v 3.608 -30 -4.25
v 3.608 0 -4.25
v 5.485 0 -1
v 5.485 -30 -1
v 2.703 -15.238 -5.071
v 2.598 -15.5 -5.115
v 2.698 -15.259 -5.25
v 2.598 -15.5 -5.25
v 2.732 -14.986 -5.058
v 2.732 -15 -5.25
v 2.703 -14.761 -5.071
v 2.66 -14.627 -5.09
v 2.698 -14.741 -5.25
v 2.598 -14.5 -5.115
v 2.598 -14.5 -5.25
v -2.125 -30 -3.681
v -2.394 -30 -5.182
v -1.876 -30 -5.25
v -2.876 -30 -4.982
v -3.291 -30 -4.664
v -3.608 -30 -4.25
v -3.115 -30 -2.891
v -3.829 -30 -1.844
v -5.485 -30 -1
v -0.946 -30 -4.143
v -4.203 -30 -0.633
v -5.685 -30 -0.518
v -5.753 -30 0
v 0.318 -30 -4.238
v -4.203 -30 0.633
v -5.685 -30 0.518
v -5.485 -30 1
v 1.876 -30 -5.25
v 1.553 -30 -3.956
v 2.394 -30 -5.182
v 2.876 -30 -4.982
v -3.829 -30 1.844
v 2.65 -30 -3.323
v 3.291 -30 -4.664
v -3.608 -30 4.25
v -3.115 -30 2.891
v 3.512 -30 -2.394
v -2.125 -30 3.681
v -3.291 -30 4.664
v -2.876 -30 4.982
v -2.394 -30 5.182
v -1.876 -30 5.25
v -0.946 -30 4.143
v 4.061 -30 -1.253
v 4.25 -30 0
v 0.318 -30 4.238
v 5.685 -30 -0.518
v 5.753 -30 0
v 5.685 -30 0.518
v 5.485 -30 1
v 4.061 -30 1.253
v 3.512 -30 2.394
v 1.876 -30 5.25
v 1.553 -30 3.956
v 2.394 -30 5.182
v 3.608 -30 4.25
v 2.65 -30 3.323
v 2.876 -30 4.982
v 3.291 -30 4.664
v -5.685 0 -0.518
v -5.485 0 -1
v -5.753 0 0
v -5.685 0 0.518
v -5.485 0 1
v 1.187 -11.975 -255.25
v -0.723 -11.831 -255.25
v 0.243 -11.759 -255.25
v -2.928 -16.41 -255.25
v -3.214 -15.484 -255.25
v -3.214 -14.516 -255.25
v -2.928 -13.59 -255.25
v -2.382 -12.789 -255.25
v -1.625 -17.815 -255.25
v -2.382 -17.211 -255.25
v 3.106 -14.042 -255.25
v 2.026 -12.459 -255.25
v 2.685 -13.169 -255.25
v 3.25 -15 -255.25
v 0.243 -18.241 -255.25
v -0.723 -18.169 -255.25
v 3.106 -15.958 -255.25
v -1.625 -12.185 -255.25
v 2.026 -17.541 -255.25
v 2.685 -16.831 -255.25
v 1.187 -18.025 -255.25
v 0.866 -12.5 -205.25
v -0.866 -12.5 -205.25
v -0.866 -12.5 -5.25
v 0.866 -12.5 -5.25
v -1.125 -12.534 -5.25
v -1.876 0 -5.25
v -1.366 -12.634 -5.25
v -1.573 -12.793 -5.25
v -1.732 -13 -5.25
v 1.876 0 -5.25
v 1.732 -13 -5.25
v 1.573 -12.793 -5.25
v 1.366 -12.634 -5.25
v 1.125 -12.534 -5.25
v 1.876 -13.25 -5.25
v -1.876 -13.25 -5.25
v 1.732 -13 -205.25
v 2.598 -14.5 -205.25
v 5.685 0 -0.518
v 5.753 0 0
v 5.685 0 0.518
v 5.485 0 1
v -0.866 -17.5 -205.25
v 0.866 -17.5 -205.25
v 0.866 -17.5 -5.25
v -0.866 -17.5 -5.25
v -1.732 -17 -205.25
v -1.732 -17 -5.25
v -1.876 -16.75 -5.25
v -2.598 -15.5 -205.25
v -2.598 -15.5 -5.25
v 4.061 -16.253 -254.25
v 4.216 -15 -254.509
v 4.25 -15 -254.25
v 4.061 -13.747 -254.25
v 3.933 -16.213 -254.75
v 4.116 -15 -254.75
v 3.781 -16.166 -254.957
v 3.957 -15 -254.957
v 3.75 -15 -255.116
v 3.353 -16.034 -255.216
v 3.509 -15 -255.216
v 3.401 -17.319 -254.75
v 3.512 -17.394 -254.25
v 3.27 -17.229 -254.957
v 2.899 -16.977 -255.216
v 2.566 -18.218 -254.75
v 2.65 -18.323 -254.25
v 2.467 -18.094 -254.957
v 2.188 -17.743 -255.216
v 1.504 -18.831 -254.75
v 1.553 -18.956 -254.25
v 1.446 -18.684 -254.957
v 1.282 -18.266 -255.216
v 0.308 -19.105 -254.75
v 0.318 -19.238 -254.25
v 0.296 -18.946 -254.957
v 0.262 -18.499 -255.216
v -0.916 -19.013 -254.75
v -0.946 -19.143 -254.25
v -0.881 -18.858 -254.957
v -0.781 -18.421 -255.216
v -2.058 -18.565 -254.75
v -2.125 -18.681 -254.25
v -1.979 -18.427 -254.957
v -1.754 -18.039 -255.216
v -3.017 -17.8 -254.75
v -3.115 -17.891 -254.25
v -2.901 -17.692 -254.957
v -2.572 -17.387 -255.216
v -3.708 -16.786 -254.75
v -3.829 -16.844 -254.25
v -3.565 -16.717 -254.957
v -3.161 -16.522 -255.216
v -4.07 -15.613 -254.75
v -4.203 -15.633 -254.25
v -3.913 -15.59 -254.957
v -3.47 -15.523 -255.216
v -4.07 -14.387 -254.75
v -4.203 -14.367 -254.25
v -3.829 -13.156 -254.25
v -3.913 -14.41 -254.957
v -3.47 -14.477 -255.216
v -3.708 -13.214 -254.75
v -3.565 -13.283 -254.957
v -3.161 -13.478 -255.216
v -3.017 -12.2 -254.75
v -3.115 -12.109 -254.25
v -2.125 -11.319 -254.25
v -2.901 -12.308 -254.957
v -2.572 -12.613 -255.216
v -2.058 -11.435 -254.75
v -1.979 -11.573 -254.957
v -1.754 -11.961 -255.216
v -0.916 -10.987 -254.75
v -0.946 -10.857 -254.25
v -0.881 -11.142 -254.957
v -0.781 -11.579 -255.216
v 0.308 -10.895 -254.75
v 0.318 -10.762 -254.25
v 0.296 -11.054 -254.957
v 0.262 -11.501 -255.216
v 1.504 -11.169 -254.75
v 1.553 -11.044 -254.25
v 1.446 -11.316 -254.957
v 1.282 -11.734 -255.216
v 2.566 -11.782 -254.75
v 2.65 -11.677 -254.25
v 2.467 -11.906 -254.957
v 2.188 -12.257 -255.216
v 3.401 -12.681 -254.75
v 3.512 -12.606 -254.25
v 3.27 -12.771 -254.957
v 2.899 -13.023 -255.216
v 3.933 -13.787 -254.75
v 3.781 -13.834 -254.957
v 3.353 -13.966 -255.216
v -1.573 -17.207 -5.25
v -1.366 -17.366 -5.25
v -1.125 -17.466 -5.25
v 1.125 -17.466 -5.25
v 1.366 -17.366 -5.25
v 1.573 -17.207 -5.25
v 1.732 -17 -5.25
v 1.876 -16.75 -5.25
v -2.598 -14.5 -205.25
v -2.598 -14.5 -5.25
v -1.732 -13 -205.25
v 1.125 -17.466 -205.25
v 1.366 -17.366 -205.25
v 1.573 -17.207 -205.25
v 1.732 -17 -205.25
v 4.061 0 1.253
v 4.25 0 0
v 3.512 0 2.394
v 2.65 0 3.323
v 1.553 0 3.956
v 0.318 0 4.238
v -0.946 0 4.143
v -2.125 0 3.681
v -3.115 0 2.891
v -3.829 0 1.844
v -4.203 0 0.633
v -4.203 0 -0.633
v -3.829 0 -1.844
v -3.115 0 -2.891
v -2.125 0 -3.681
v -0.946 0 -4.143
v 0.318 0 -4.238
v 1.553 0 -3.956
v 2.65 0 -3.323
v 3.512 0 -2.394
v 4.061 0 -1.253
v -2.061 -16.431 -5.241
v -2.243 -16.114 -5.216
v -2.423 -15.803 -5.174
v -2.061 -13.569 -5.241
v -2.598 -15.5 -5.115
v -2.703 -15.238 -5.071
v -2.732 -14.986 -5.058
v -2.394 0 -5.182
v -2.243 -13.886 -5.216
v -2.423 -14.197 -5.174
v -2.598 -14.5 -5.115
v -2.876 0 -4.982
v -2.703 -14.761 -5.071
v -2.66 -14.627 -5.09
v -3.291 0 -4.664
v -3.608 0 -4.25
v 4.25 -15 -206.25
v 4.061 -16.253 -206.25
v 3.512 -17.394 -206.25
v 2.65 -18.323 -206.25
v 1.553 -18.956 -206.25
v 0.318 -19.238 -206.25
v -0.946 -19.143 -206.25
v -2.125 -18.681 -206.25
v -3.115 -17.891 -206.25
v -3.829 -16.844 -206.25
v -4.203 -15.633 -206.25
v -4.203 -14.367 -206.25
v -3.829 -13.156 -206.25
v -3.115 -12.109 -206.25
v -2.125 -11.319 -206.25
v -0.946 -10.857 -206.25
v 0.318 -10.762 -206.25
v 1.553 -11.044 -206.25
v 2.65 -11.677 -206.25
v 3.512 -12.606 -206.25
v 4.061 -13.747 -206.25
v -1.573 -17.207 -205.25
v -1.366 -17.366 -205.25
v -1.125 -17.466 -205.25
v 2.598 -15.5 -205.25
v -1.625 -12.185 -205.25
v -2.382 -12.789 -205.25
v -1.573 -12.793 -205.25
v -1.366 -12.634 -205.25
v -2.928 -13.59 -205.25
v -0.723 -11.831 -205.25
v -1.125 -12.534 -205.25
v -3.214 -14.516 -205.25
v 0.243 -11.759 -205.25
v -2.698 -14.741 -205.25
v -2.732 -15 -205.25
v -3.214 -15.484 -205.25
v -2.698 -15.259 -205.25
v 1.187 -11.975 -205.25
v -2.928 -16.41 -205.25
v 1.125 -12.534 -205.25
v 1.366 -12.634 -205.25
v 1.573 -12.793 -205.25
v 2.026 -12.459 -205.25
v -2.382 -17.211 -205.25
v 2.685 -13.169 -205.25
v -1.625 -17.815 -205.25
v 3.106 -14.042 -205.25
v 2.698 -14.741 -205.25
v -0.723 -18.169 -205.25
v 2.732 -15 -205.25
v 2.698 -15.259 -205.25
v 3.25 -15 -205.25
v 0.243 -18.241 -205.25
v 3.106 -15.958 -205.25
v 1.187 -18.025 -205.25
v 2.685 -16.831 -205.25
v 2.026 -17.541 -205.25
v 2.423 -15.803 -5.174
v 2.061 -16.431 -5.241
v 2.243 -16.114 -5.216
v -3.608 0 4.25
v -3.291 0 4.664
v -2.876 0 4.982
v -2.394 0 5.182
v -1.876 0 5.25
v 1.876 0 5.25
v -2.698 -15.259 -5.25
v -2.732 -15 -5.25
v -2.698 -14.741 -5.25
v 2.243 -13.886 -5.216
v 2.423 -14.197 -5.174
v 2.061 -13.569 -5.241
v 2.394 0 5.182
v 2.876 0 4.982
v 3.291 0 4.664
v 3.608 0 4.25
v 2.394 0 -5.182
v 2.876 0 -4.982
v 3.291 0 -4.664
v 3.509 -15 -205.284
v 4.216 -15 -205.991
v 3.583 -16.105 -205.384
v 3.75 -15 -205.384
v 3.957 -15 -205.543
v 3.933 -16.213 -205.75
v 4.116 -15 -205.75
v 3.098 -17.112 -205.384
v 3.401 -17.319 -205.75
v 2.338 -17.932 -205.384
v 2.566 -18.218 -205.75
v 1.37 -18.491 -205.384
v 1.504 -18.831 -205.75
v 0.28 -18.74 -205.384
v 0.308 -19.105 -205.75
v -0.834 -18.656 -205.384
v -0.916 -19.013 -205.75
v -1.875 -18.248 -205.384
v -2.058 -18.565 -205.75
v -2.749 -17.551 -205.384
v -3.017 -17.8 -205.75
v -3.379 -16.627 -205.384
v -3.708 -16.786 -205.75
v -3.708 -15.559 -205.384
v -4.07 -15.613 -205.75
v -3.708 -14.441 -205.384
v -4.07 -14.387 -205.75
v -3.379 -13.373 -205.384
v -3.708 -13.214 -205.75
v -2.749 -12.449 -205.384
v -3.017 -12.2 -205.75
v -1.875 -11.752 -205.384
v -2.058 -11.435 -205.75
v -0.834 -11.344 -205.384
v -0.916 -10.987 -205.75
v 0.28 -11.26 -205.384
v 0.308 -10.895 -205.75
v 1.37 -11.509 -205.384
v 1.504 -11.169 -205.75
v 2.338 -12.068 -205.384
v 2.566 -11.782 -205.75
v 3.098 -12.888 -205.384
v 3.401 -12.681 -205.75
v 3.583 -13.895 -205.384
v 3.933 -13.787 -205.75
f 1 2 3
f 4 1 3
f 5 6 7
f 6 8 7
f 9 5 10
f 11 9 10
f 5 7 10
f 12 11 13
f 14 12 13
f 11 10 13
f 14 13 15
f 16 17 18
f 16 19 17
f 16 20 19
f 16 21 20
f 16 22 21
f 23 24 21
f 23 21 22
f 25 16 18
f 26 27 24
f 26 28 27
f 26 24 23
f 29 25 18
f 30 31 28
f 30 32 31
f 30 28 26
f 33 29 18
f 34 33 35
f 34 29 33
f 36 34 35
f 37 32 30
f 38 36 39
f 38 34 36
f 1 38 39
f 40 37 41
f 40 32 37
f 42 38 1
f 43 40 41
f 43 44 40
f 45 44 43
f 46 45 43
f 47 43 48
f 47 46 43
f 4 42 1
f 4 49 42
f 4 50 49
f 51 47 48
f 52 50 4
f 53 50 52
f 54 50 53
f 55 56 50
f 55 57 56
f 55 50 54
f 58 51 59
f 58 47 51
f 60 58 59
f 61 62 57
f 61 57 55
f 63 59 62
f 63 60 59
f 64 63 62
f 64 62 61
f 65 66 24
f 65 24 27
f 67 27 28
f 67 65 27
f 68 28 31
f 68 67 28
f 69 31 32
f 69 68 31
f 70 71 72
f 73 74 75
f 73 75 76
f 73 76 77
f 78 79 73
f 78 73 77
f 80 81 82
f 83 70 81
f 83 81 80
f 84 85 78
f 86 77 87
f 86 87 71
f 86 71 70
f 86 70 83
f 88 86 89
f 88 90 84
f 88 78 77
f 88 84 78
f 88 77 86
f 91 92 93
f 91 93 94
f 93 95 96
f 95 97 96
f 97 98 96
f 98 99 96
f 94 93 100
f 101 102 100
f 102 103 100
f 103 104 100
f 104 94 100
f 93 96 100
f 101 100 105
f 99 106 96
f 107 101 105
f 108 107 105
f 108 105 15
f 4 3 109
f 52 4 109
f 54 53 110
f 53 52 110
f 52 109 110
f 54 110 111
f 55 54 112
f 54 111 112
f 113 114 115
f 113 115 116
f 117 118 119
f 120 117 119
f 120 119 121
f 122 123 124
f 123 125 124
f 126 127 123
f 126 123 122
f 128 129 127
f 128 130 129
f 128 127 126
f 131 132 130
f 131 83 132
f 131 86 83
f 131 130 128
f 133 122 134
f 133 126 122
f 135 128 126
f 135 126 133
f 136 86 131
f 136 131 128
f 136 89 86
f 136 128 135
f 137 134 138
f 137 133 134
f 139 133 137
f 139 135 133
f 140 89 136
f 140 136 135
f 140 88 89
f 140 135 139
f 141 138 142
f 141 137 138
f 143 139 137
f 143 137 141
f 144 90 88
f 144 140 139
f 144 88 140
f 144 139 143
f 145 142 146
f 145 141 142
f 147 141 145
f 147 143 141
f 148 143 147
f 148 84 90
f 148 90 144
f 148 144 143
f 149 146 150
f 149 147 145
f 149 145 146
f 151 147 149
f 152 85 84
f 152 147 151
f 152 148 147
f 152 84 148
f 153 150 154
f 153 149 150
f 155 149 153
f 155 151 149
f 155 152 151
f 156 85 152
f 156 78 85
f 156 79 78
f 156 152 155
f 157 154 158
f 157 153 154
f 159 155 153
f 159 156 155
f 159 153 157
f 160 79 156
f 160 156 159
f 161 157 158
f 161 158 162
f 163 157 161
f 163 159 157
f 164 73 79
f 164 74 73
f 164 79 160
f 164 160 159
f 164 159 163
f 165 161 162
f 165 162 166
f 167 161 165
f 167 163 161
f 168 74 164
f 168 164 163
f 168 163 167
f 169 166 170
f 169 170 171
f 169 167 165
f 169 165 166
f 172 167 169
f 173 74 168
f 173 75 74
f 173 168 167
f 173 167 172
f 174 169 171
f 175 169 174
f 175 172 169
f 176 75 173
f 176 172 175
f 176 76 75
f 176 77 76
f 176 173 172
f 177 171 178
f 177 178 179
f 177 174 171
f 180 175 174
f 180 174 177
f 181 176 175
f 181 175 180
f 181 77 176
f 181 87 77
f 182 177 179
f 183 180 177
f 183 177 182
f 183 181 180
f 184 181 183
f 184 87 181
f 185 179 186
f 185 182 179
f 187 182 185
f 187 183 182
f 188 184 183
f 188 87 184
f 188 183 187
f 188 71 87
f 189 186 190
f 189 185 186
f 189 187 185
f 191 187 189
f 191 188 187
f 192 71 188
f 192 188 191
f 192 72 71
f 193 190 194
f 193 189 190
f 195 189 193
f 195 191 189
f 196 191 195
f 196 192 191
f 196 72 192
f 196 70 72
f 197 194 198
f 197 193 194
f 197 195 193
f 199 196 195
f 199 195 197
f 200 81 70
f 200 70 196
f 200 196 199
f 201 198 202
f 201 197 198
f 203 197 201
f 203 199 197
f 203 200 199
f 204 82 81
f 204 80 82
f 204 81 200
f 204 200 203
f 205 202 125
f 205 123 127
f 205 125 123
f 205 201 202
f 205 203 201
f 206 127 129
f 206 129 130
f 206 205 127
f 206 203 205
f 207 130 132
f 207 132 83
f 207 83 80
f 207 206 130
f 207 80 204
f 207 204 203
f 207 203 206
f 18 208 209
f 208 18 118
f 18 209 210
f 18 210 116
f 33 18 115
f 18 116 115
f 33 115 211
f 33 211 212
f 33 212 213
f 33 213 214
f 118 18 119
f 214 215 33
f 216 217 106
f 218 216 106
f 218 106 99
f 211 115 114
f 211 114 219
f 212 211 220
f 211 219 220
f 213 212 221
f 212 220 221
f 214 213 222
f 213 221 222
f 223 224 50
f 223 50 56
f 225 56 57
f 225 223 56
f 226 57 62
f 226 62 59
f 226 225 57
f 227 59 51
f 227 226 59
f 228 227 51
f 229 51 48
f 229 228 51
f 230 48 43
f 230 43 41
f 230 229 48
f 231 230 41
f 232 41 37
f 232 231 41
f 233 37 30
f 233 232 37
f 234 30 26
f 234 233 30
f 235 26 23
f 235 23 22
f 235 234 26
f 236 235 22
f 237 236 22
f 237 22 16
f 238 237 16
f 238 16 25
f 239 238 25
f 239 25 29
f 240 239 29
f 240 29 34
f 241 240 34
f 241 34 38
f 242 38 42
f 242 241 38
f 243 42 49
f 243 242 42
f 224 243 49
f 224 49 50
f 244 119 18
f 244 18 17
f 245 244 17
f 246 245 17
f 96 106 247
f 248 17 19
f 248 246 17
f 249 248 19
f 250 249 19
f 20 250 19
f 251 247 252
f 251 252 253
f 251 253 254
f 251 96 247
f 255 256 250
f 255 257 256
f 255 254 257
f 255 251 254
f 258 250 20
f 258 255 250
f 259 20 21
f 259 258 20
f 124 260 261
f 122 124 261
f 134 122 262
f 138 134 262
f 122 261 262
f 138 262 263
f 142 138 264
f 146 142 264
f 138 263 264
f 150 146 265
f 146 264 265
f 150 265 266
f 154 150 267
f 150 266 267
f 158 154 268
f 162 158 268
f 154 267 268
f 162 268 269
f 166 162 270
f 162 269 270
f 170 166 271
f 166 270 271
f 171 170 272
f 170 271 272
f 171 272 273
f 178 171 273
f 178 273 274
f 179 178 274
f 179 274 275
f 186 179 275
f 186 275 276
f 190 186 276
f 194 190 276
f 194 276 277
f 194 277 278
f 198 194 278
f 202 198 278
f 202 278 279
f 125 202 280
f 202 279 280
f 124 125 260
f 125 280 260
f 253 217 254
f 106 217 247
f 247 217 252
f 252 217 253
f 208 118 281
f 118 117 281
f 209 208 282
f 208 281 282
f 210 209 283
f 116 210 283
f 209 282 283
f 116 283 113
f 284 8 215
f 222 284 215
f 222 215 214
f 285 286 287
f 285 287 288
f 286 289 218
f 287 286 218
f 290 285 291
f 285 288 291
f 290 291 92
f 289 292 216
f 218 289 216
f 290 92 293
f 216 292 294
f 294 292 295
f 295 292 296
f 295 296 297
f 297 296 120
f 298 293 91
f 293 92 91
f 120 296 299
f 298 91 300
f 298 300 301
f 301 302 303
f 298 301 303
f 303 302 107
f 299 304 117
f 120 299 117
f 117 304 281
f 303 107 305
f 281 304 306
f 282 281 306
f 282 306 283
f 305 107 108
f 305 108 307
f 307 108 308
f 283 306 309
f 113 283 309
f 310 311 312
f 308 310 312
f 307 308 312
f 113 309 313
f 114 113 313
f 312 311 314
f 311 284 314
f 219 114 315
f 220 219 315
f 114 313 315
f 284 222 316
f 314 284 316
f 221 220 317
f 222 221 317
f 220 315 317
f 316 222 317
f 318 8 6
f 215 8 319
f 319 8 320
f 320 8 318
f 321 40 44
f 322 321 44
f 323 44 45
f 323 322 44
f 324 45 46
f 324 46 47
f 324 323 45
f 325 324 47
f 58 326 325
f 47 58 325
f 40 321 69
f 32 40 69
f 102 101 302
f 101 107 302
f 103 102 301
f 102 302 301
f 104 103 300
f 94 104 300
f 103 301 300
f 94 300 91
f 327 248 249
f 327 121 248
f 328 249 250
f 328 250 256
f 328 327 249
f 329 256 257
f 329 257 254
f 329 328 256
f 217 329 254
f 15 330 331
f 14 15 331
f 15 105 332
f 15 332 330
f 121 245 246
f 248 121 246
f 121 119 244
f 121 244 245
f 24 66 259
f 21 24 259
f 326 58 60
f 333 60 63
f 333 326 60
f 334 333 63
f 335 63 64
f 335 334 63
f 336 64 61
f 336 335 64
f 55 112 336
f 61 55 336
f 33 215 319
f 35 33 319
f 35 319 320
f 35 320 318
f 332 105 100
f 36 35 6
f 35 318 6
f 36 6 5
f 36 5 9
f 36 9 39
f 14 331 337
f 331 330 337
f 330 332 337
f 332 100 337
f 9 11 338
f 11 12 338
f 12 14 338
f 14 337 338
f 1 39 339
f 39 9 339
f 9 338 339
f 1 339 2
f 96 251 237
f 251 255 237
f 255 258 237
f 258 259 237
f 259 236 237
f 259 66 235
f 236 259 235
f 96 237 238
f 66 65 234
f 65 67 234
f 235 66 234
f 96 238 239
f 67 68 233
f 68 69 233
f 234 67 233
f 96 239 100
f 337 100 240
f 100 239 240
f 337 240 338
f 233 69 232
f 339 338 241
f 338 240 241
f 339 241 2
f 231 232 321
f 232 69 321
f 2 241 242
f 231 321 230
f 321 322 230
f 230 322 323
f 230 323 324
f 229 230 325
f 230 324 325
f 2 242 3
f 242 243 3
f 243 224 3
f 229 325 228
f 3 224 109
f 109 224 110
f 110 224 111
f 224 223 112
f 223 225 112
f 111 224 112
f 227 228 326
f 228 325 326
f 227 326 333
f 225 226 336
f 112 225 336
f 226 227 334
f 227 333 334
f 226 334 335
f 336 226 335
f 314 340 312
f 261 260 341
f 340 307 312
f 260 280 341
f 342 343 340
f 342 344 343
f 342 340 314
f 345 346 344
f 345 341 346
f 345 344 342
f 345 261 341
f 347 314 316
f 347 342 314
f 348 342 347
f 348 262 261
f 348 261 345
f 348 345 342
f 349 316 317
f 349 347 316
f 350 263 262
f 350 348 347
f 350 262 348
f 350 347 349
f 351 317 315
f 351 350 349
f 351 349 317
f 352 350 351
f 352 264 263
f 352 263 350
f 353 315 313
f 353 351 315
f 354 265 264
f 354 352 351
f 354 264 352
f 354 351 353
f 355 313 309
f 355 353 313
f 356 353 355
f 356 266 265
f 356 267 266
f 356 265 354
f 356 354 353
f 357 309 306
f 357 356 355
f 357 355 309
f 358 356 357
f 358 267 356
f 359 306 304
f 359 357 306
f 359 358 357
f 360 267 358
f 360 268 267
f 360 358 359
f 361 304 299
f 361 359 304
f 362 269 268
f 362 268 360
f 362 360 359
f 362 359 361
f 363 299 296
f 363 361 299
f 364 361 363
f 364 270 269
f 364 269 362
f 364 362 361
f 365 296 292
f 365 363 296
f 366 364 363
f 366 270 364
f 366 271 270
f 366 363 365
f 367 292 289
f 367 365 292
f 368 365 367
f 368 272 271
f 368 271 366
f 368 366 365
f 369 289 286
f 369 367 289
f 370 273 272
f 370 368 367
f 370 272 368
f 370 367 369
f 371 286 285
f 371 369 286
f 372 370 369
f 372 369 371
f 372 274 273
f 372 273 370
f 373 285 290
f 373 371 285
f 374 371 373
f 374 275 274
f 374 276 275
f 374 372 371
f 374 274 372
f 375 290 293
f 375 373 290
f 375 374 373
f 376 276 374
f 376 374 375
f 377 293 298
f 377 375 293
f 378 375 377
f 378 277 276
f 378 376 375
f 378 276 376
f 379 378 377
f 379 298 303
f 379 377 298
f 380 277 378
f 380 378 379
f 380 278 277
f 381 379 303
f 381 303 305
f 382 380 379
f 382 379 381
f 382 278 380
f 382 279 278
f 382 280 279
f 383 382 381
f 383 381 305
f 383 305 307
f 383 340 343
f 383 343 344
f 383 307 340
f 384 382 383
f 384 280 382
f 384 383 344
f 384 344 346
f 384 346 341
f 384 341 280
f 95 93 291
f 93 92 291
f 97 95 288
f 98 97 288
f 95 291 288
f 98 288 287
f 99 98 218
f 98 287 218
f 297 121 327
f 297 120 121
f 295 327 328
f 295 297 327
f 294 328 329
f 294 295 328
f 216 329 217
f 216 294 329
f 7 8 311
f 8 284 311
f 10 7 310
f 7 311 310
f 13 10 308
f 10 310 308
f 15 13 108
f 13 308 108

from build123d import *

# Parameters (mm, degrees)
F0_R         = 4.25
F1_DEPTH     = 30
F3_DEPTH     = 200
F4_R         = 4.25
F5_DEPTH     = 50
F6_T1_DEPTH  = 35.7735026919
F6_T6_DEPTH  = 35.7735026919
F6_T12_DEPTH = 35.7735026919
F6_T18_DEPTH = 35.7735026919
F6_T24_DEPTH = 35.7735026919
F6_T30_DEPTH = 35.7735026919
F6_T36_DEPTH = 35.7735026919
F7_R         = 1
F8_R         = 1


# Not quite as in the source:
# - a fillet or chamfer that OpenCascade refuses, or shapes differently, is made with other operations: its cross-section is extruded or revolved along the edge and cut away or added


with BuildPart() as f1:
    # F0 (on Front) → F1 (new body)
    with BuildSketch(Plane.XZ):
        Polygon((3.0310889132, 5.25), (-3.0310889132, 5.25), (-6.0621778265, 0), (-3.0310889132, -5.25), (3.0310889132, -5.25), (6.0621778265, 0), align=None)
        Circle(F0_R, mode=Mode.SUBTRACT)
    extrude(amount=F1_DEPTH)

    # F2 (on face) → F3 (join)
    with BuildSketch(Plane(origin=(0, 0, -5.25), x_dir=(1, 0, 0), z_dir=(0, 0, -1))):
        Polygon((-1.443375673, 12.5), (0, 12.5), (1.443375673, 12.5), (2.8867513459, 15), (1.443375673, 17.5), (-1.443375673, 17.5), (-2.8867513459, 15), align=None)
    extrude(amount=F3_DEPTH)

    # F4 (on face) → F5 (join)
    with BuildSketch(Plane(origin=(0, 0, -205.25), x_dir=(1, 0, 0), z_dir=(0, 0, -1))):
        with Locations((0, 15)):
            Circle(F4_R)
        Polygon((-1.443375673, 12.5), (-2.8867513459, 15), (-1.443375673, 17.5), (1.443375673, 17.5), (2.8867513459, 15), (1.443375673, 12.5), align=None, mode=Mode.SUBTRACT)
        Polygon((-1.443375673, 17.5), (-2.8867513459, 15), (-1.443375673, 12.5), (1.443375673, 12.5), (2.8867513459, 15), (1.443375673, 17.5), align=None)
    extrude(amount=F5_DEPTH)

    # F6: fillet of radius 2 on 6 edges, made by hand

    # F6_s2 → F6_t1 (cut)
    with BuildSketch(Plane.XZ.offset(-2.8867513459)):
        with BuildLine():
            ThreePointArc((5.4848275573, -1), (5.7527767497, 0), (5.4848275573, 1))
            Line((5.4848275573, 1), (6.0621778265, 0))
            Line((6.0621778265, 0), (5.4848275573, -1))
        make_face()
        with BuildLine():
            ThreePointArc((1.8763883749, 5.25), (2.8763883749, 4.9820508076), (3.6084391824, 4.25))
            Line((3.6084391824, 4.25), (3.0310889132, 5.25))
            Line((3.0310889132, 5.25), (1.8763883749, 5.25))
        make_face()
        with BuildLine():
            ThreePointArc((-3.6084391824, 4.25), (-2.8763883749, 4.9820508076), (-1.8763883749, 5.25))
            Line((-1.8763883749, 5.25), (-3.0310889132, 5.25))
            Line((-3.0310889132, 5.25), (-3.6084391824, 4.25))
        make_face()
        with BuildLine():
            ThreePointArc((-5.4848275573, -1), (-5.7527767497, 0), (-5.4848275573, 1))
            Line((-5.4848275573, 1), (-6.0621778265, 0))
            Line((-6.0621778265, 0), (-5.4848275573, -1))
        make_face()
    extrude(amount=F6_T1_DEPTH, mode=Mode.SUBTRACT)


with BuildPart() as f6_tool4:
    # F6_s5 → F6_t6 (new body)
    with BuildSketch(Plane.XZ.offset(-2.8867513459)):
        with BuildLine():
            ThreePointArc((1.8763883749, -5.25), (2.8763883749, -4.9820508076), (3.6084391824, -4.25))
            Line((3.6084391824, -4.25), (3.0310889132, -5.25))
            Line((3.0310889132, -5.25), (1.8763883749, -5.25))
        make_face()
    extrude(amount=F6_T6_DEPTH)

    split(bisect_by=Plane(origin=(-4.3301270189, -2.5, 0), x_dir=(0, 0, 1), z_dir=(0.8660254038, 0.5, 0)), keep=Keep.TOP)

    split(bisect_by=Plane(origin=(8.6602540378, -5, 0), x_dir=(0, 0, 1), z_dir=(-0.8660254038, 0.5, 0)), keep=Keep.TOP)


with BuildPart() as f1_1:
    add(f1.part)

    # F6_t3: cut F6_tool4
    add(f6_tool4.part, mode=Mode.SUBTRACT)


with BuildPart() as f6_tool10:
    # F6_s11 → F6_t12 (new body)
    with BuildSketch(Plane.XZ.offset(-2.8867513459)):
        with BuildLine():
            ThreePointArc((1.8763883749, -5.25), (2.8763883749, -4.9820508076), (3.6084391824, -4.25))
            Line((3.6084391824, -4.25), (3.0310889132, -5.25))
            Line((3.0310889132, -5.25), (1.8763883749, -5.25))
        make_face()
    extrude(amount=F6_T12_DEPTH)

    split(bisect_by=Plane(origin=(-4.3301270189, -2.5, 0), x_dir=(0, 0, 1), z_dir=(0.8660254038, 0.5, 0)), keep=Keep.TOP)

    split(bisect_by=Plane(origin=(8.6602540378, -5, 0), x_dir=(0, 0, 1), z_dir=(0.8660254038, -0.5, 0)), keep=Keep.TOP)


with BuildPart() as f1_2:
    add(f1_1.part)

    # F6_t9: cut F6_tool10
    add(f6_tool10.part, mode=Mode.SUBTRACT)


with BuildPart() as f6_tool16:
    # F6_s17 → F6_t18 (new body)
    with BuildSketch(Plane.XZ.offset(-2.8867513459)):
        with BuildLine():
            ThreePointArc((1.8763883749, -5.25), (2.8763883749, -4.9820508076), (3.6084391824, -4.25))
            Line((3.6084391824, -4.25), (3.0310889132, -5.25))
            Line((3.0310889132, -5.25), (1.8763883749, -5.25))
        make_face()
    extrude(amount=F6_T18_DEPTH)

    split(bisect_by=Plane(origin=(-4.3301270189, -2.5, 0), x_dir=(0, 0, 1), z_dir=(-0.8660254038, -0.5, 0)), keep=Keep.TOP)

    split(bisect_by=Plane(origin=(8.6602540378, -5, 0), x_dir=(0, 0, 1), z_dir=(0.8660254038, -0.5, 0)), keep=Keep.TOP)


with BuildPart() as f1_3:
    add(f1_2.part)

    # F6_t15: cut F6_tool16
    add(f6_tool16.part, mode=Mode.SUBTRACT)


with BuildPart() as f6_tool22:
    # F6_s23 → F6_t24 (new body)
    with BuildSketch(Plane.XZ.offset(-2.8867513459)):
        with BuildLine():
            ThreePointArc((-1.8763883749, -5.25), (-2.8763883749, -4.9820508076), (-3.6084391824, -4.25))
            Line((-3.6084391824, -4.25), (-3.0310889132, -5.25))
            Line((-3.0310889132, -5.25), (-1.8763883749, -5.25))
        make_face()
    extrude(amount=F6_T24_DEPTH)

    split(bisect_by=Plane(origin=(-8.6602540378, -5, 0), x_dir=(0, 0, 1), z_dir=(0.8660254038, 0.5, 0)), keep=Keep.TOP)

    split(bisect_by=Plane(origin=(4.3301270189, -2.5, 0), x_dir=(0, 0, 1), z_dir=(-0.8660254038, 0.5, 0)), keep=Keep.TOP)


with BuildPart() as f1_4:
    add(f1_3.part)

    # F6_t21: cut F6_tool22
    add(f6_tool22.part, mode=Mode.SUBTRACT)


with BuildPart() as f6_tool28:
    # F6_s29 → F6_t30 (new body)
    with BuildSketch(Plane.XZ.offset(-2.8867513459)):
        with BuildLine():
            ThreePointArc((-1.8763883749, -5.25), (-2.8763883749, -4.9820508076), (-3.6084391824, -4.25))
            Line((-3.6084391824, -4.25), (-3.0310889132, -5.25))
            Line((-3.0310889132, -5.25), (-1.8763883749, -5.25))
        make_face()
    extrude(amount=F6_T30_DEPTH)

    split(bisect_by=Plane(origin=(-8.6602540378, -5, 0), x_dir=(0, 0, 1), z_dir=(-0.8660254038, -0.5, 0)), keep=Keep.TOP)

    split(bisect_by=Plane(origin=(4.3301270189, -2.5, 0), x_dir=(0, 0, 1), z_dir=(-0.8660254038, 0.5, 0)), keep=Keep.TOP)


with BuildPart() as f1_5:
    add(f1_4.part)

    # F6_t27: cut F6_tool28
    add(f6_tool28.part, mode=Mode.SUBTRACT)


with BuildPart() as f6_tool34:
    # F6_s35 → F6_t36 (new body)
    with BuildSketch(Plane.XZ.offset(-2.8867513459)):
        with BuildLine():
            ThreePointArc((-1.8763883749, -5.25), (-2.8763883749, -4.9820508076), (-3.6084391824, -4.25))
            Line((-3.6084391824, -4.25), (-3.0310889132, -5.25))
            Line((-3.0310889132, -5.25), (-1.8763883749, -5.25))
        make_face()
    extrude(amount=F6_T36_DEPTH)

    split(bisect_by=Plane(origin=(-8.6602540378, -5, 0), x_dir=(0, 0, 1), z_dir=(-0.8660254038, -0.5, 0)), keep=Keep.TOP)

    split(bisect_by=Plane(origin=(4.3301270189, -2.5, 0), x_dir=(0, 0, 1), z_dir=(0.8660254038, -0.5, 0)), keep=Keep.TOP)


with BuildPart() as f1_6:
    add(f1_5.part)

    # F6_t33: cut F6_tool34
    add(f6_tool34.part, mode=Mode.SUBTRACT)

    # F7
    f7_edges = [f1_6.edges().sort_by_distance(p)[0] for p in [
        (-1.443376, -17.5, -105.25),
        (1.443376, -17.5, -105.25),
        (-2.886751, -15, -105.113013),
        (-1.443376, -12.5, -105.25),
        (2.886751, -15, -105.113013),
        (1.443376, -12.5, -105.25),
    ]]
    fillet(f7_edges, radius=F7_R)

    # F8
    f8_edges = [f1_6.edges().sort_by_distance(p)[0] for p in [
        (-4.25, -15, -255.25),
        (-4.25, -15, -205.25),
    ]]
    fillet(f8_edges, radius=F8_R)


solid = f1_6.part
